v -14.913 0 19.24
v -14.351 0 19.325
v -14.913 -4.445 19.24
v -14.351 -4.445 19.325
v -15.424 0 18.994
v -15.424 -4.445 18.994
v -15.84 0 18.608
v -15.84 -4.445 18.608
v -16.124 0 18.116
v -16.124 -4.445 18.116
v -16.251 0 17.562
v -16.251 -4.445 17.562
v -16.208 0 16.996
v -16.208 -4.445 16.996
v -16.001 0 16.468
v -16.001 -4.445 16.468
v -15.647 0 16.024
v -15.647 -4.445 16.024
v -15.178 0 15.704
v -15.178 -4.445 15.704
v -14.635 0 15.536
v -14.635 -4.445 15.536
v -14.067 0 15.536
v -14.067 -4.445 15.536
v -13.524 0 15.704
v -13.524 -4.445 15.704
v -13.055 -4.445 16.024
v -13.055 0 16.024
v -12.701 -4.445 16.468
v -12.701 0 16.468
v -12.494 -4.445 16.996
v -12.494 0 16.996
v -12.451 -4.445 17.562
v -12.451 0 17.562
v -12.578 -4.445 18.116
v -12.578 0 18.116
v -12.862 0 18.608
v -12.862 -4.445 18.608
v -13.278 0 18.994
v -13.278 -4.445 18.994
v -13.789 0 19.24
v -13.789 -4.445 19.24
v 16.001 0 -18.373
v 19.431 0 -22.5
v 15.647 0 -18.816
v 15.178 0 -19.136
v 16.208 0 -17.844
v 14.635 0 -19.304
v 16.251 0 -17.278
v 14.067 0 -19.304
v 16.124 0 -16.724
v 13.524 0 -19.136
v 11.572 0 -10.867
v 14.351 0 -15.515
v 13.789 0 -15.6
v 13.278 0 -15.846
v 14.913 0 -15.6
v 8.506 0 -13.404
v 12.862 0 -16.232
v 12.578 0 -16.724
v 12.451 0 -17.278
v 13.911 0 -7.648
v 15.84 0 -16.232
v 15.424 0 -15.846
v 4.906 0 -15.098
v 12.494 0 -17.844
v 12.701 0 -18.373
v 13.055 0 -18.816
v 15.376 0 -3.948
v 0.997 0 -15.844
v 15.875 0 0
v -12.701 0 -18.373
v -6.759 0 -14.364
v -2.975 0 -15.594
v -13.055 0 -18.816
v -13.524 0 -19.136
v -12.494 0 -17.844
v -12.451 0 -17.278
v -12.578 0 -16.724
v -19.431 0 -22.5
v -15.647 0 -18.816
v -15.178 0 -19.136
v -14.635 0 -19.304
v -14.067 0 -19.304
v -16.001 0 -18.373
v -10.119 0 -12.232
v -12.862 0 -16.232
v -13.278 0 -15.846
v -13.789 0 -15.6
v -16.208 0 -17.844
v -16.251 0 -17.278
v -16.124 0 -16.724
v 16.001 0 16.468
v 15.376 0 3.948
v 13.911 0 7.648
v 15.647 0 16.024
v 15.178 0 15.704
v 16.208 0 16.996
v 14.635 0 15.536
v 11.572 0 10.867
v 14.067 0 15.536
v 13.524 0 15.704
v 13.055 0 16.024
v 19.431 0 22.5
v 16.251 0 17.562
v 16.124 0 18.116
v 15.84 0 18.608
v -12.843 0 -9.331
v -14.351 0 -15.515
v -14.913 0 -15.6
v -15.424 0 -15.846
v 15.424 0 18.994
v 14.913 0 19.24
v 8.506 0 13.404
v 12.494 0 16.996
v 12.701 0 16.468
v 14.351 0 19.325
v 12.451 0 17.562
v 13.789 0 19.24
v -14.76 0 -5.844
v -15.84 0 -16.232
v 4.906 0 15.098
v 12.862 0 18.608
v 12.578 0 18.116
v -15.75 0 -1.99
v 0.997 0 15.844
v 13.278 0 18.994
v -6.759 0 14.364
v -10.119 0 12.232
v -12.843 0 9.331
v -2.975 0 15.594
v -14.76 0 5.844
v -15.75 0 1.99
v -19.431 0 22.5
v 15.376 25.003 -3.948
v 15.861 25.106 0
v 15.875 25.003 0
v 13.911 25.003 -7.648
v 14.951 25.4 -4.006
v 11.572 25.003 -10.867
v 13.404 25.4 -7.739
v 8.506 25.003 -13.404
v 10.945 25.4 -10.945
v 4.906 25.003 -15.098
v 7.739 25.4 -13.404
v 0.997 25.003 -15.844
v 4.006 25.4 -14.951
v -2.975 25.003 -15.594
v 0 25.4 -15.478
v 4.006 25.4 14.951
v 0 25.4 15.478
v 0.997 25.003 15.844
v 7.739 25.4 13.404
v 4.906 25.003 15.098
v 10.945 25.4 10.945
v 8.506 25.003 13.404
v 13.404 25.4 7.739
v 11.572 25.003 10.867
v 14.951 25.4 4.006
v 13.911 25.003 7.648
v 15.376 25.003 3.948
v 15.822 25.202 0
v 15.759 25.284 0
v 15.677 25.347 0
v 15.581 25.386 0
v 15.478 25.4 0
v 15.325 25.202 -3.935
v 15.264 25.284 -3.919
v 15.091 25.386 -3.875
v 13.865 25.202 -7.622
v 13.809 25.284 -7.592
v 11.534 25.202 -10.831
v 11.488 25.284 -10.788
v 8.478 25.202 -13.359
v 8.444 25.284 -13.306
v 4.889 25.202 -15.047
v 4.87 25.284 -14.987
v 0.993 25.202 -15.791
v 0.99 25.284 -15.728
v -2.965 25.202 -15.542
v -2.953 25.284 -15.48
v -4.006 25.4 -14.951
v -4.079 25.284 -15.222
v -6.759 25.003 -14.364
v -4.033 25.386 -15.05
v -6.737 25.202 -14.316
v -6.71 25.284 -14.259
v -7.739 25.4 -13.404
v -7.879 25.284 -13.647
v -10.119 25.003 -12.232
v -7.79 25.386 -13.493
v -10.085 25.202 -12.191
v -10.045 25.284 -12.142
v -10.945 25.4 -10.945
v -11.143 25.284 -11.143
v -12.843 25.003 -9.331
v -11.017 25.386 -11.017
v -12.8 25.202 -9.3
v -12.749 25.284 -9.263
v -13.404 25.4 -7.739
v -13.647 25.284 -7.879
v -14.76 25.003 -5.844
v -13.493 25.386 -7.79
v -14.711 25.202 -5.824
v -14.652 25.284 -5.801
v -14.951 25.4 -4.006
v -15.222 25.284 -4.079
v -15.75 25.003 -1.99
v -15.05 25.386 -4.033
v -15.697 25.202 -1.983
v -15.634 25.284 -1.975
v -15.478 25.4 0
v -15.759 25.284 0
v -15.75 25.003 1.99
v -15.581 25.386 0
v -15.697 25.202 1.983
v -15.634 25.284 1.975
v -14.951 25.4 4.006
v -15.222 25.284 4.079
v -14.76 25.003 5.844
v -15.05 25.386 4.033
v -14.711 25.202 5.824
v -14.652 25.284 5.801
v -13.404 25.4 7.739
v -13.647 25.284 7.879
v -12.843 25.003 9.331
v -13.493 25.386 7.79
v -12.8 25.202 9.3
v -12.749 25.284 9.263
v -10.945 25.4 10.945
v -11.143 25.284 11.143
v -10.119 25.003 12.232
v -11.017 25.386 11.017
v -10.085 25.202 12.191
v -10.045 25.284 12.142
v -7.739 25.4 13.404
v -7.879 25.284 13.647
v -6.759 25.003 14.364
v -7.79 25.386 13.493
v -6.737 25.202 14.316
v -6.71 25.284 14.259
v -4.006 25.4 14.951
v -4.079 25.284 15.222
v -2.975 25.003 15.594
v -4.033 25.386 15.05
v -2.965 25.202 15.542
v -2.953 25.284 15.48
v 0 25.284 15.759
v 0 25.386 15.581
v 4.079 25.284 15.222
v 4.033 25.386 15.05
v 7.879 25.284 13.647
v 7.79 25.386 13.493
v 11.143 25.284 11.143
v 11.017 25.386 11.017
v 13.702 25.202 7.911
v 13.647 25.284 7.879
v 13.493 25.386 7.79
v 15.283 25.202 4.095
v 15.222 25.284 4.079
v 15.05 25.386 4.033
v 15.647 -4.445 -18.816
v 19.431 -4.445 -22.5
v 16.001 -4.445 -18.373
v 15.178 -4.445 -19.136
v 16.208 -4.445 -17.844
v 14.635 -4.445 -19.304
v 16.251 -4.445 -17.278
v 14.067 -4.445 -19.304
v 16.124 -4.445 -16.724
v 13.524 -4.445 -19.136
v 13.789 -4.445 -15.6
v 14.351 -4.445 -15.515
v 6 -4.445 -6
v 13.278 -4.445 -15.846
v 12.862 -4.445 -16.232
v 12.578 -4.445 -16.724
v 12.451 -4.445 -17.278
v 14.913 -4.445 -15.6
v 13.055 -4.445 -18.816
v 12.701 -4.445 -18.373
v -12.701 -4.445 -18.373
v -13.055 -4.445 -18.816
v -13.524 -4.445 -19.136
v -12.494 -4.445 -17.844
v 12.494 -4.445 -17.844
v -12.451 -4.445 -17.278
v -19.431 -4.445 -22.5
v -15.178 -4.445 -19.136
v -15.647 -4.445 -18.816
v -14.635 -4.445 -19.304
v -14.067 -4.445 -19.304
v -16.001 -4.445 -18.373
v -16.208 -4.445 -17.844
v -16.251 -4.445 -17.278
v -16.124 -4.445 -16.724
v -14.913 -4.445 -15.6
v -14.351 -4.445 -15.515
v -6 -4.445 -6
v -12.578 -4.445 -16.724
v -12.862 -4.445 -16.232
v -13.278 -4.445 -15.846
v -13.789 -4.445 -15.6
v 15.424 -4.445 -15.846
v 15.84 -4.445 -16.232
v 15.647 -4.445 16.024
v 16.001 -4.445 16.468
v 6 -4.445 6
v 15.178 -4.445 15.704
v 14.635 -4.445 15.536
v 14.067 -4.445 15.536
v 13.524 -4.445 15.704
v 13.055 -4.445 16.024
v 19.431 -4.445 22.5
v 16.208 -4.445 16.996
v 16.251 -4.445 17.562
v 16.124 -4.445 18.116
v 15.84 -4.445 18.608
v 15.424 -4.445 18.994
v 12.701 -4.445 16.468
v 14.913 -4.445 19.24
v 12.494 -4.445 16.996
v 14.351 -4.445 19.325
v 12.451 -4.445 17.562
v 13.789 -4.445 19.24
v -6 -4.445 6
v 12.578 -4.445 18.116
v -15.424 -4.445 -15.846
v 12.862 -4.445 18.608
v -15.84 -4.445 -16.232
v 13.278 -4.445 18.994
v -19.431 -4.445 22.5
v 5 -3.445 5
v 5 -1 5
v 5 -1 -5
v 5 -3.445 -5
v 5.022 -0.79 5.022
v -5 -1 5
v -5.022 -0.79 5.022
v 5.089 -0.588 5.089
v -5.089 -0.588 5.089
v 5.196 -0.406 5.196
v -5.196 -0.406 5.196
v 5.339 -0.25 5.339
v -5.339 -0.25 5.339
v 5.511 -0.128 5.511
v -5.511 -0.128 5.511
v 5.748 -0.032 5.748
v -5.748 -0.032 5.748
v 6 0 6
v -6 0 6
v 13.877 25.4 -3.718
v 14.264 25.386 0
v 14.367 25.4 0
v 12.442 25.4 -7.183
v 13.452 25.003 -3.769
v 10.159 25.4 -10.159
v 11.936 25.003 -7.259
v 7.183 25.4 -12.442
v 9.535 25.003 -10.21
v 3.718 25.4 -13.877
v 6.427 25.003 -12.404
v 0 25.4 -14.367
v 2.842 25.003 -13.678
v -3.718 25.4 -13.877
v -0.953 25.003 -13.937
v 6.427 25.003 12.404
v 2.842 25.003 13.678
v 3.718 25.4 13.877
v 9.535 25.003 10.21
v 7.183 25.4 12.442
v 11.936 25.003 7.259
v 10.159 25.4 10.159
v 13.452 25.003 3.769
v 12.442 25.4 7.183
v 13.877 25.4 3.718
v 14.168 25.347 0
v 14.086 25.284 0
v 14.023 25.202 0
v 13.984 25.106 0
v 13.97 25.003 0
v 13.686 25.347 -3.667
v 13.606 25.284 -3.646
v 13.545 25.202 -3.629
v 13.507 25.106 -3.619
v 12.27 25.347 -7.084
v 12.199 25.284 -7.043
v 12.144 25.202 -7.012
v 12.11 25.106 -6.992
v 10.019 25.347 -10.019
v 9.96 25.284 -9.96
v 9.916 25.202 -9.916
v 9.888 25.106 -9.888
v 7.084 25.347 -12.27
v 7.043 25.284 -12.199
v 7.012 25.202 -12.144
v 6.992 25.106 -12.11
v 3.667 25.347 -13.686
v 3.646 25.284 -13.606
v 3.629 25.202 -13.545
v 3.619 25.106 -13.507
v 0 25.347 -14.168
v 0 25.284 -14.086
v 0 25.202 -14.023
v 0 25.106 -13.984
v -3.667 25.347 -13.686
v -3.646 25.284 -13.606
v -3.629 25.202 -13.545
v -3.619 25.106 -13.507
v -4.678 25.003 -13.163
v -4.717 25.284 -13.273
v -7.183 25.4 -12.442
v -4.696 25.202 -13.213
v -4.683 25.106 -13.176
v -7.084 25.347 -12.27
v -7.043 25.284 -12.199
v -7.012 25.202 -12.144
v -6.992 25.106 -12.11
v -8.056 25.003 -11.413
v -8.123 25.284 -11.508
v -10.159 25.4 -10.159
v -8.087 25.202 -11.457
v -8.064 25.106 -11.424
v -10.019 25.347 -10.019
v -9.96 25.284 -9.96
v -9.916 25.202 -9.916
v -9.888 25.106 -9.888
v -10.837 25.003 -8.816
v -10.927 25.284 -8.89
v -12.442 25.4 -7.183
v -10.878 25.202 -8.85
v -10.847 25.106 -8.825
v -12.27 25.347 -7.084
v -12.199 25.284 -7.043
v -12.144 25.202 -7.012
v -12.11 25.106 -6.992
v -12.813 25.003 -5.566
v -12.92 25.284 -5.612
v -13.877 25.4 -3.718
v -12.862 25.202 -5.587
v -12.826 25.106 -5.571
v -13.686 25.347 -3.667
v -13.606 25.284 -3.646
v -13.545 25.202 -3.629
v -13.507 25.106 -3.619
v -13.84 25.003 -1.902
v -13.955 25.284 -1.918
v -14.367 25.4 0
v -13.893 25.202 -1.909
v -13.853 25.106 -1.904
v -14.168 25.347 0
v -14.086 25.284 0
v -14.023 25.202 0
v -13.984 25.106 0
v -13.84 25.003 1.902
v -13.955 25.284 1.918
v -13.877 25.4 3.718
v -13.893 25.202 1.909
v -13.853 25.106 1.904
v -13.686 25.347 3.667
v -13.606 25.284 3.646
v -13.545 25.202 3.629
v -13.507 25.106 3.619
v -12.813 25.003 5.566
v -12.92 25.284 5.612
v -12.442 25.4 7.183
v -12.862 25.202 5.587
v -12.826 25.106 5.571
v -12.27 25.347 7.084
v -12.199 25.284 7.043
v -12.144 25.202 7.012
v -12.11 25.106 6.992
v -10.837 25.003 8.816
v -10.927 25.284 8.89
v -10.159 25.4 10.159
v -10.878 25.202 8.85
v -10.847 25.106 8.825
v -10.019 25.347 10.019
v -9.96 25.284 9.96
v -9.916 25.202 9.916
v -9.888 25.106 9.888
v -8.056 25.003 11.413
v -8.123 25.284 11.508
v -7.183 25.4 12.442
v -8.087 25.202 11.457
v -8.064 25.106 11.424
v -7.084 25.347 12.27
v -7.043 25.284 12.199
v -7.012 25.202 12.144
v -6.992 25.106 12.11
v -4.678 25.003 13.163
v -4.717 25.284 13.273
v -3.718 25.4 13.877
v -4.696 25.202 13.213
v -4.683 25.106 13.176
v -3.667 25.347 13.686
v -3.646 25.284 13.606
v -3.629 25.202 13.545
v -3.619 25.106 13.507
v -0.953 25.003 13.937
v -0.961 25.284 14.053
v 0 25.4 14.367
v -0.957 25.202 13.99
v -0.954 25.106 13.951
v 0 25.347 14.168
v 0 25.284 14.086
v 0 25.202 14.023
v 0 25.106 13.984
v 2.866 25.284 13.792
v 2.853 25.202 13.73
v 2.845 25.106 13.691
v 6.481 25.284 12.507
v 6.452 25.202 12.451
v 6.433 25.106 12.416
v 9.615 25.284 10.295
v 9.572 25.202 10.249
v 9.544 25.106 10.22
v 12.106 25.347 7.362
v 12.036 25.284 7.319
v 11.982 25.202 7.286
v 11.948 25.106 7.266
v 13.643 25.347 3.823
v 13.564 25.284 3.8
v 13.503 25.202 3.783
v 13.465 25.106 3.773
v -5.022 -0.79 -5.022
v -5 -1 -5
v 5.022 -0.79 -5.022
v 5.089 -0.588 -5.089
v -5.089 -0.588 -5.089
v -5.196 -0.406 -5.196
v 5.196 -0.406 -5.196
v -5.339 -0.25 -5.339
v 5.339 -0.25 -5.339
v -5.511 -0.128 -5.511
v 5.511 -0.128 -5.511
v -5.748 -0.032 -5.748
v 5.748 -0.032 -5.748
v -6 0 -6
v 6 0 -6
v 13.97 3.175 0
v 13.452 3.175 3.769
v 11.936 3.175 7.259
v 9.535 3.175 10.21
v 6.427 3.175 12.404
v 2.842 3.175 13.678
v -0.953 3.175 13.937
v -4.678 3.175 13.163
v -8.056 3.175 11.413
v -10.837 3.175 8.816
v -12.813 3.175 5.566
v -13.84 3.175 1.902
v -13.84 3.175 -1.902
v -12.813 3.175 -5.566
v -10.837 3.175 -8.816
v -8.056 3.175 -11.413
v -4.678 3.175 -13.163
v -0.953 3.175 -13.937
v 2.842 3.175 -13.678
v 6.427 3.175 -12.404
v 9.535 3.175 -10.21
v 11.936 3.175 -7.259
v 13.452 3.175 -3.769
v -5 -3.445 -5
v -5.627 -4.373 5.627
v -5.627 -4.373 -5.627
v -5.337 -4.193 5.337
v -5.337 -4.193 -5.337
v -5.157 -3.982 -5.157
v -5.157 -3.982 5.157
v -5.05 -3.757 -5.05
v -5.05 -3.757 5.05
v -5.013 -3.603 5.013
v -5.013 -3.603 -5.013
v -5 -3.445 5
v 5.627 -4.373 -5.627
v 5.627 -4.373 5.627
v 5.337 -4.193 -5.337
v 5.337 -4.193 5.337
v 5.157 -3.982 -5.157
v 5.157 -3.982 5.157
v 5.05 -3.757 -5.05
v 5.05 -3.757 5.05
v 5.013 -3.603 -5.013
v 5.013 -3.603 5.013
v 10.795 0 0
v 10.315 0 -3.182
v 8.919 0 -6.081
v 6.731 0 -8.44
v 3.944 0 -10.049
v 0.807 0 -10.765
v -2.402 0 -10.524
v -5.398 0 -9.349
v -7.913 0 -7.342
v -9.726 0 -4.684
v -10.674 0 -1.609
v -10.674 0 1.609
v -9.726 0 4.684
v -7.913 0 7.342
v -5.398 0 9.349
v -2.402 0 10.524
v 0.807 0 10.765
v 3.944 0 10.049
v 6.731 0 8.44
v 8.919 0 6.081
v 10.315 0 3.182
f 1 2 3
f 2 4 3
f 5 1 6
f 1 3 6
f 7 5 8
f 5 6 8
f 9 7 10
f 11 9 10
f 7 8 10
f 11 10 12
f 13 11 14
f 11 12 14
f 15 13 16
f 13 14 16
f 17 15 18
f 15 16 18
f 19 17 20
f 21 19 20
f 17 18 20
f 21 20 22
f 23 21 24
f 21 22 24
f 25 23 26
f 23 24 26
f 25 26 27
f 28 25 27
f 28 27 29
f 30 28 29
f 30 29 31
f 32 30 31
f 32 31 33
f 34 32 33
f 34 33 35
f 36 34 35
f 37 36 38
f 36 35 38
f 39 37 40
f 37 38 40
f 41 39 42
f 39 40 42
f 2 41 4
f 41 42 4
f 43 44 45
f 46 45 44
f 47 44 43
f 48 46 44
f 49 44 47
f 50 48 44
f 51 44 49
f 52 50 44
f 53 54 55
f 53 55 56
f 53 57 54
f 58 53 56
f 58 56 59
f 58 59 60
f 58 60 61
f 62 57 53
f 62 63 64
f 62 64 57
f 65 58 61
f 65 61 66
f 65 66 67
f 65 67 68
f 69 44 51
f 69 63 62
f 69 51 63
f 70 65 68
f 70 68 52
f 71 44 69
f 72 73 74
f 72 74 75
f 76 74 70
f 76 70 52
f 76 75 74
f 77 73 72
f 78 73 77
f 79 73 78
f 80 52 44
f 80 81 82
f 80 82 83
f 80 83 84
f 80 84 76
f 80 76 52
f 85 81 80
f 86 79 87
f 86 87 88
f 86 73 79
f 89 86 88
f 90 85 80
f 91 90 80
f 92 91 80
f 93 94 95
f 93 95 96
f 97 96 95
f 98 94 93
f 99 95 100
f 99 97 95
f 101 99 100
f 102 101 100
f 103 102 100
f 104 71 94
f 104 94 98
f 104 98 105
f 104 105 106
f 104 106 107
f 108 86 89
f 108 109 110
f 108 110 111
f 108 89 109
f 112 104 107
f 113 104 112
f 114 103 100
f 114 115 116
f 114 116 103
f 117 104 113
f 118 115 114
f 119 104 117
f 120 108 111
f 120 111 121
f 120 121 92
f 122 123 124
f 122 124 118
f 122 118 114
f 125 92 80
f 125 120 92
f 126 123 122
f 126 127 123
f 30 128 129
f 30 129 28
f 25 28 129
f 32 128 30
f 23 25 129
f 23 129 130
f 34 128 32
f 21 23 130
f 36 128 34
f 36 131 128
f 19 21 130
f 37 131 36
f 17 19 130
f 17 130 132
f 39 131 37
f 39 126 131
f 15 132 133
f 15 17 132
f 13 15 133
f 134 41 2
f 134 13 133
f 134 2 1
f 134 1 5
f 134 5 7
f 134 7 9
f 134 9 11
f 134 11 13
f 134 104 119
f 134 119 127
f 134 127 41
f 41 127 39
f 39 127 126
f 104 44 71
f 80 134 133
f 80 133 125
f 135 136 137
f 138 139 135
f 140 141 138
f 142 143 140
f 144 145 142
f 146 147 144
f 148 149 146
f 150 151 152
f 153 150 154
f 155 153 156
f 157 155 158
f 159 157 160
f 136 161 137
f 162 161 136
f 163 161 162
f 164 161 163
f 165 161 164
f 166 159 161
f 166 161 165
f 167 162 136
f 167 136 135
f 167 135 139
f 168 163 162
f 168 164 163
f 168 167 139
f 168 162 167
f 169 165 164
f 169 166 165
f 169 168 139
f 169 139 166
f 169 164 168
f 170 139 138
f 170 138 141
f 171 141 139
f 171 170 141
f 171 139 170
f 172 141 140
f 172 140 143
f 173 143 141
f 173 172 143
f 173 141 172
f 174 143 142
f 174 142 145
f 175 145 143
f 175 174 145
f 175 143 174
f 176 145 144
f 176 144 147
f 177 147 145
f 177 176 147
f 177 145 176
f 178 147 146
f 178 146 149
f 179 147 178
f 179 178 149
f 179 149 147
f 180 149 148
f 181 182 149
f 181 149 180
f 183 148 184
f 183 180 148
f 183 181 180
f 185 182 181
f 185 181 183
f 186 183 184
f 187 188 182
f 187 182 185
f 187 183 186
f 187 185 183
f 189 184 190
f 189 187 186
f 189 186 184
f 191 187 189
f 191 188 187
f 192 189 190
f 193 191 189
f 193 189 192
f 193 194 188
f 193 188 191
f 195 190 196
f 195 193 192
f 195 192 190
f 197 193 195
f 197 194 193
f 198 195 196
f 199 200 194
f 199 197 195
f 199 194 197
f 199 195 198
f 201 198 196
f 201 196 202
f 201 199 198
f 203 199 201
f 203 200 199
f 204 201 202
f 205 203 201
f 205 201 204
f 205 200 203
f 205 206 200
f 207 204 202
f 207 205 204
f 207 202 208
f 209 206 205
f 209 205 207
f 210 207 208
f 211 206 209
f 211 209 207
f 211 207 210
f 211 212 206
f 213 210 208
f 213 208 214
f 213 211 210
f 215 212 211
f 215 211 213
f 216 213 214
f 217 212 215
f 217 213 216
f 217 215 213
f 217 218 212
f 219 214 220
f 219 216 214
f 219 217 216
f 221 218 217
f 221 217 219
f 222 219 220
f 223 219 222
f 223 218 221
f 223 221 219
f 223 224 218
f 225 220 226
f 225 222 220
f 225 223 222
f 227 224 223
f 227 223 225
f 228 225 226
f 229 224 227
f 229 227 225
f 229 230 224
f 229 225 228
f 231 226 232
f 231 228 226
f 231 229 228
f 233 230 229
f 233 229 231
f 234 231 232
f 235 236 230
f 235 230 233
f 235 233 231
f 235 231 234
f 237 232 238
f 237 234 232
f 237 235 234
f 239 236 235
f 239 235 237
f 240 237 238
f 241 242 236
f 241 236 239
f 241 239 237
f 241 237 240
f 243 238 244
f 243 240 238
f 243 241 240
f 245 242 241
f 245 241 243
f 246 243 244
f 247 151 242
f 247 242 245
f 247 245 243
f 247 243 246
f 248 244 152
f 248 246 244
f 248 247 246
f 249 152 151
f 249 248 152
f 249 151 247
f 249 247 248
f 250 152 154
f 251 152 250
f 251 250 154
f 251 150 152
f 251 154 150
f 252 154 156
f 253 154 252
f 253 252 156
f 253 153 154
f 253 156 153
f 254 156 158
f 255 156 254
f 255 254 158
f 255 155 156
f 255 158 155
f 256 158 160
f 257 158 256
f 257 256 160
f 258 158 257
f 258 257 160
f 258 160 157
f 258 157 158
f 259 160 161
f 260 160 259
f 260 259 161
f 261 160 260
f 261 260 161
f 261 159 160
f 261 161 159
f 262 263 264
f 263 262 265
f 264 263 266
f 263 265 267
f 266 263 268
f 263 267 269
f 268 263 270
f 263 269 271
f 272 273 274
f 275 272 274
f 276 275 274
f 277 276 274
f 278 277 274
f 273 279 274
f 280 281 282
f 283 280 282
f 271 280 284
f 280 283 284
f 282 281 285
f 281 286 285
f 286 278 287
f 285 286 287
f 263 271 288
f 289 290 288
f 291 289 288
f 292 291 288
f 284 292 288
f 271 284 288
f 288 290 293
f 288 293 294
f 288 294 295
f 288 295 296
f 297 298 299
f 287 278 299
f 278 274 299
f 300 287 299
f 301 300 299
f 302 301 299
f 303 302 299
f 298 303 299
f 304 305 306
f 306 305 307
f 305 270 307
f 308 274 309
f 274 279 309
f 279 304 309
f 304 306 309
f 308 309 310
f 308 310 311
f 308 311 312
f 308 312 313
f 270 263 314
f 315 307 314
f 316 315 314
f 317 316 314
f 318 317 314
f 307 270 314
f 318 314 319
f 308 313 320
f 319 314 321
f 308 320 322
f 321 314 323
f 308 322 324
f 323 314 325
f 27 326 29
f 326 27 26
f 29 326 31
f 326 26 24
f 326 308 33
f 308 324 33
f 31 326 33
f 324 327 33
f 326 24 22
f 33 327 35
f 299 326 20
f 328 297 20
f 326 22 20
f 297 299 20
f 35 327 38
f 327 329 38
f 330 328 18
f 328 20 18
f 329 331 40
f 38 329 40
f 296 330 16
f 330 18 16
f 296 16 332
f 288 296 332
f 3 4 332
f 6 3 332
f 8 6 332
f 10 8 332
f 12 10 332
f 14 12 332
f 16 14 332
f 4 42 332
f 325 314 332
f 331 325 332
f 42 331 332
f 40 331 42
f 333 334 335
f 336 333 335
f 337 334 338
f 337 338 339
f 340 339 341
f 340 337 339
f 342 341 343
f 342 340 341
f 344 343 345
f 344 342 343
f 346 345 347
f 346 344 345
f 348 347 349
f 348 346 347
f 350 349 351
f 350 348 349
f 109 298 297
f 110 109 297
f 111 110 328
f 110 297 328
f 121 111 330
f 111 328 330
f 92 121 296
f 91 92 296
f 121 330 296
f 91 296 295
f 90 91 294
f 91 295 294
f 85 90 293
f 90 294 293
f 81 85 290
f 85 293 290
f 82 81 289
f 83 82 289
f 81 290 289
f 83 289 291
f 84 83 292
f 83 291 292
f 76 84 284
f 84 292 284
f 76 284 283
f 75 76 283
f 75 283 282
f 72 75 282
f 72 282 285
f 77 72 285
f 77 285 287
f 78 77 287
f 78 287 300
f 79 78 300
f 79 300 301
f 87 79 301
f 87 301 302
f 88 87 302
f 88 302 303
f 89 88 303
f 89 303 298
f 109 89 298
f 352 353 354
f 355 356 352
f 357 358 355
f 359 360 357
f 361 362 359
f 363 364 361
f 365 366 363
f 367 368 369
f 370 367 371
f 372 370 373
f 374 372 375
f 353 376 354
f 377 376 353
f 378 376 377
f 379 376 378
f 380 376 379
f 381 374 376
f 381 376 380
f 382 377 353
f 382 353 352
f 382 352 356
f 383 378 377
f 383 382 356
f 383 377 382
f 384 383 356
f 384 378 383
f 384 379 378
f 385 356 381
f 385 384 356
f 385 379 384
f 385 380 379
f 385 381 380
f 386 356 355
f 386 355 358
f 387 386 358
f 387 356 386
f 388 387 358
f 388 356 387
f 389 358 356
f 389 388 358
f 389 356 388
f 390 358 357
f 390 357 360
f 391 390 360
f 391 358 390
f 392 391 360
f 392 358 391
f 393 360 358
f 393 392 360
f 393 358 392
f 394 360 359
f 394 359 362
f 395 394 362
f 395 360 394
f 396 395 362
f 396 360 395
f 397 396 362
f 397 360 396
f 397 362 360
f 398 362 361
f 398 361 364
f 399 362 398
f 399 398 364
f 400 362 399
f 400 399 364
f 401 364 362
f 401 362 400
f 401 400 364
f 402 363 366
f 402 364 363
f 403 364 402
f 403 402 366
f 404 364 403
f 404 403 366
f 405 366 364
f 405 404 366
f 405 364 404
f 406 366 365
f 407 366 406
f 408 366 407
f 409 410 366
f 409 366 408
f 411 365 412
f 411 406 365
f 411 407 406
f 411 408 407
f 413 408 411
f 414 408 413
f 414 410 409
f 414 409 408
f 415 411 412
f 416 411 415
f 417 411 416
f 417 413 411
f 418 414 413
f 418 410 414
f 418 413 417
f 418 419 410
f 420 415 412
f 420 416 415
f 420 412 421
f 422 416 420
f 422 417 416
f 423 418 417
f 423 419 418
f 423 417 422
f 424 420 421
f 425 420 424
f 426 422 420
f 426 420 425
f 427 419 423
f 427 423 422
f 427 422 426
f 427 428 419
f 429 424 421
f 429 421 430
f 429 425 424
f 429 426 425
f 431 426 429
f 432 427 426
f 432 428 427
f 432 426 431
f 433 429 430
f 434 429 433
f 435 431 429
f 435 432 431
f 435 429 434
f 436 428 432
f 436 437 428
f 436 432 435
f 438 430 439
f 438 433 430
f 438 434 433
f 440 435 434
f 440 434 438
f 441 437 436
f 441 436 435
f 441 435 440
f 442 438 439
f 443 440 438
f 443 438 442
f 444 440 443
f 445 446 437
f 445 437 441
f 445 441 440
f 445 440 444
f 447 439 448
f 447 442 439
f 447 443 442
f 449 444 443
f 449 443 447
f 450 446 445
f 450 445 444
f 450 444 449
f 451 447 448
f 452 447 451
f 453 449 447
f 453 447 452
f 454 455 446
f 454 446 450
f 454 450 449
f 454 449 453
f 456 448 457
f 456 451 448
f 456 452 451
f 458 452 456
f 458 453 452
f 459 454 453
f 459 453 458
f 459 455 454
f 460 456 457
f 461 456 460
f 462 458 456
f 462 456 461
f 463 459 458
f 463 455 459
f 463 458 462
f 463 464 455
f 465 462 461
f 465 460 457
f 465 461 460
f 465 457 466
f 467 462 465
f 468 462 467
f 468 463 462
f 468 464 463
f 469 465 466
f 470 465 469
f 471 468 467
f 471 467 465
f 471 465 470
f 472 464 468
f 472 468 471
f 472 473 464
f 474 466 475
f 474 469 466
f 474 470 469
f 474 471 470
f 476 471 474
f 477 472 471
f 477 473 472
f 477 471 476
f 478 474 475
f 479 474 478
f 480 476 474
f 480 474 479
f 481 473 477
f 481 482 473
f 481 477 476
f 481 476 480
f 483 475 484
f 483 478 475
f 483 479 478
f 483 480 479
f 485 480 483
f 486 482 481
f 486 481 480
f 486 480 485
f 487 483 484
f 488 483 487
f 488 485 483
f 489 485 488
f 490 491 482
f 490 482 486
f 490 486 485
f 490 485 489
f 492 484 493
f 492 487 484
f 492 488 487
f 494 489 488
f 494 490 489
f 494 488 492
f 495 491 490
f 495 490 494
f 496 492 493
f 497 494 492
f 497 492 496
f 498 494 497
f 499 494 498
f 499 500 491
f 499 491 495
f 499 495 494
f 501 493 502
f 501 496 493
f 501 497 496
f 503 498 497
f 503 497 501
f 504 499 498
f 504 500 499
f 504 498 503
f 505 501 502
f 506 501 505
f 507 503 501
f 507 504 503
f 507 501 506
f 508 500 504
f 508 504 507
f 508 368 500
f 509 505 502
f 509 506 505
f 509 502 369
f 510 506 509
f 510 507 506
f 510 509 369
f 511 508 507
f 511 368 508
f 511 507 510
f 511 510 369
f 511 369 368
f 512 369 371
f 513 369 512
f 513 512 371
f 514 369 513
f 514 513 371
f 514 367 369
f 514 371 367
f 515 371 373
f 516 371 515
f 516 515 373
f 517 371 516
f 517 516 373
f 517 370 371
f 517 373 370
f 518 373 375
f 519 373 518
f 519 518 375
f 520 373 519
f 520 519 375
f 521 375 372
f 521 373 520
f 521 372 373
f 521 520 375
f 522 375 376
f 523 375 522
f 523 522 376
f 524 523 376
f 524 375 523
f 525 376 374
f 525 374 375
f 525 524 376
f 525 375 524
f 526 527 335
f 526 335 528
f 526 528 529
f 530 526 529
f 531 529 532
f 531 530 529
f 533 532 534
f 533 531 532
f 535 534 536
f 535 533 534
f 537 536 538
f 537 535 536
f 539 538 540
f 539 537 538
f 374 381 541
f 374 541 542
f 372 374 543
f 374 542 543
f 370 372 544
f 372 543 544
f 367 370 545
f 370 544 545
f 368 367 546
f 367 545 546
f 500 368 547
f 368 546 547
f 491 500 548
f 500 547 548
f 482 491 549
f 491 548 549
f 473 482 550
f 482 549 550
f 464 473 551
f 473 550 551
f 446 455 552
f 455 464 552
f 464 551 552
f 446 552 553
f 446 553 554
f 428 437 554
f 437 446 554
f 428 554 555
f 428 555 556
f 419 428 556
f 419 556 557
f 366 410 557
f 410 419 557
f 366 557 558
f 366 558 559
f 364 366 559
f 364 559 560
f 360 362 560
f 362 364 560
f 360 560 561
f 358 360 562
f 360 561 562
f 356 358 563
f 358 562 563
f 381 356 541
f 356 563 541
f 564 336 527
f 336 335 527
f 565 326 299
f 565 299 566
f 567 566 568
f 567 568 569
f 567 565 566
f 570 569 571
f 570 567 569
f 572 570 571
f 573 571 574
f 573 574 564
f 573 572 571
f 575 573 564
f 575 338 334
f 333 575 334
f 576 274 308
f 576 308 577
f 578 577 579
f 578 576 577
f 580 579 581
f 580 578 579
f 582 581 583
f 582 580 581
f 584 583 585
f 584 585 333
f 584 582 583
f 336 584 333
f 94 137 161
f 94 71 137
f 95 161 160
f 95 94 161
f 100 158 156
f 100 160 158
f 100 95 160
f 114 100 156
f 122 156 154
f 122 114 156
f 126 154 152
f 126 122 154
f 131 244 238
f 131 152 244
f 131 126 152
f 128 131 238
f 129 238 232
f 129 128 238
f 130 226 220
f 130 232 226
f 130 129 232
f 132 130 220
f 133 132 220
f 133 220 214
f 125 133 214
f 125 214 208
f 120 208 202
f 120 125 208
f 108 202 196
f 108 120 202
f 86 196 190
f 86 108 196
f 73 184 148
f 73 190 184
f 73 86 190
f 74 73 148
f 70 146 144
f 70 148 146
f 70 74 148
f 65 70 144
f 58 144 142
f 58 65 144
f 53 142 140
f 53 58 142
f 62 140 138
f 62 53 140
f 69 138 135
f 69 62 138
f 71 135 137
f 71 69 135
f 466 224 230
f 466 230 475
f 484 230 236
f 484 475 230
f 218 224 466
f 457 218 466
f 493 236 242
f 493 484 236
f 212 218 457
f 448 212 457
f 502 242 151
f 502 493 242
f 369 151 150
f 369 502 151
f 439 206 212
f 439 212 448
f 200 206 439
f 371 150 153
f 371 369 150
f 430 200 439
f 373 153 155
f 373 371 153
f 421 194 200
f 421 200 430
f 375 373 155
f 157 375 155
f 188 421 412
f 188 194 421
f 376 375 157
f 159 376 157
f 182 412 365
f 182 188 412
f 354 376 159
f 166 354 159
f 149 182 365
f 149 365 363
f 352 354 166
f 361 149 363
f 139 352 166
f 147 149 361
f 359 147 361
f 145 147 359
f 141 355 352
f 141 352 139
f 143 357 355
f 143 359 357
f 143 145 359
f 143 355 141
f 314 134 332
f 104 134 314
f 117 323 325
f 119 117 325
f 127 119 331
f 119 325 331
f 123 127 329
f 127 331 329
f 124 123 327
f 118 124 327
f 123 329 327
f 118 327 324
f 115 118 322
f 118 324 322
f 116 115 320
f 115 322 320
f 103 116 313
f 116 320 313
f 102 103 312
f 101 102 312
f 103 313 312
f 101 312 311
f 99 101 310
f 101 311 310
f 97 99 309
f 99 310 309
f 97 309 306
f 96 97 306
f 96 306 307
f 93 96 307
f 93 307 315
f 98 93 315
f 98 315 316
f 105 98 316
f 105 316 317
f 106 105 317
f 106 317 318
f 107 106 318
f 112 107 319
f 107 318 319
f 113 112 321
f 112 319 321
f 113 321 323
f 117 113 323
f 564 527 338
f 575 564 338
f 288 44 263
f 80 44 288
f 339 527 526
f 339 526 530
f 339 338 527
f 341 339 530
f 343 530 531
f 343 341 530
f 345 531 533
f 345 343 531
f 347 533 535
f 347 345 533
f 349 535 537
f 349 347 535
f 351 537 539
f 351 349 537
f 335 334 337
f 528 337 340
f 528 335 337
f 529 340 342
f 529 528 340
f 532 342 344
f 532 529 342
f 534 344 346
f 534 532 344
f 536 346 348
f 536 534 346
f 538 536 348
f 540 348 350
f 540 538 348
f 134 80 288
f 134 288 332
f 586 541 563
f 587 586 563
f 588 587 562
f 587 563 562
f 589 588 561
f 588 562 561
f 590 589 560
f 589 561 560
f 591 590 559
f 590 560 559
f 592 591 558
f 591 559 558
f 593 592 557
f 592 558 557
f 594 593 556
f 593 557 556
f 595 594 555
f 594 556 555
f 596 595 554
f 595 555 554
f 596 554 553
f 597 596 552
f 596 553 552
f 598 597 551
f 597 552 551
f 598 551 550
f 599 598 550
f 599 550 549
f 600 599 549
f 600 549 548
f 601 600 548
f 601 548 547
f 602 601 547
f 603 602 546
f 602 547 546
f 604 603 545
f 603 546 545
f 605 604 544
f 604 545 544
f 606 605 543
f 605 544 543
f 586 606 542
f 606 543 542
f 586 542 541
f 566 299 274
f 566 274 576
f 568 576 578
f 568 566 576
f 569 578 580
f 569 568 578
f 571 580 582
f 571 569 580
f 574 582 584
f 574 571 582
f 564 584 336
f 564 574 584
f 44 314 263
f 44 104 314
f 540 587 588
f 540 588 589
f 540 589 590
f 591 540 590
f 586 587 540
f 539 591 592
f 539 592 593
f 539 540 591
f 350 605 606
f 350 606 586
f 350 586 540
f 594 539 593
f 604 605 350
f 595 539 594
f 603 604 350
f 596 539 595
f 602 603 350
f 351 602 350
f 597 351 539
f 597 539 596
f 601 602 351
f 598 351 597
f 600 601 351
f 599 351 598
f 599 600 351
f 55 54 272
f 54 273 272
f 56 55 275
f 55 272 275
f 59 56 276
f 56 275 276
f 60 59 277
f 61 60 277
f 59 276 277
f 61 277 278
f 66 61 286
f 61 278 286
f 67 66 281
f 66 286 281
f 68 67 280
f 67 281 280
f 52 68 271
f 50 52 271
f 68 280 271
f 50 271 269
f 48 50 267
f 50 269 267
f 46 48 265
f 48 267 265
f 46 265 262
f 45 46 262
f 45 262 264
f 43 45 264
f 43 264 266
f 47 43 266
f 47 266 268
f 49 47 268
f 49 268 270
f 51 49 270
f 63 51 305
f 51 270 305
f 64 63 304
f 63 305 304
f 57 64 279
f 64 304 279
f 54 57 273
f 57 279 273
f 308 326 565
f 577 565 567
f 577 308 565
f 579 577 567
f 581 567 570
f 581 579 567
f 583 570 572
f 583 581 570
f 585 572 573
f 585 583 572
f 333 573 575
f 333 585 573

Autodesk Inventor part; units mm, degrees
ref_plane "YZ Plane" through (0, 0, 0) normal (1, 0, 0) x (0, 1, 0)
ref_plane "XZ Plane" through (0, 0, 0) normal (0, 1, 0) x (-1, 0, 0)
ref_plane "XY Plane" through (0, 0, 0) normal (0, 0, 1) x (1, 0, 0)
sketch "Sketch1" plane through (0, 0, 0) normal (0, 1, 0) x (-1, 0, 0)
  line L0 (19.431, 22.5) -> (-19.431, 22.5)
  line L1 (-19.431, 22.5) -> (-19.431, -22.5)
  line L2 (-19.431, -22.5) -> (19.431, -22.5)
  line L3 (19.431, -22.5) -> (19.431, 22.5)
  line L4 (19.431, 22.5) -> (-19.431, -22.5) construction
  line L5 (-19.431, 22.5) -> (19.431, -22.5) construction
  point P0 (0, 0)
  dimension "d0" = 38.862
  dimension "d1" = 45
extrude "ExtrusionForFloor" add sketch "Sketch1" against normal blind 4.445
sketch "Sketch4" plane through (0, 0, 0) normal (0, 1, 0) x (1, 0, 0)
  line L0 (-5, -5) -> (5, -5)
  line L1 (5, -5) -> (5, 5)
  line L2 (5, 5) -> (-5, 5)
  line L3 (-5, 5) -> (-5, -5)
  line L4 (-5, -5) -> (5, 5) construction
  line L5 (5, -5) -> (-5, 5) construction
  point P0 (0, 0)
  dimension "d21" = 10
extrude "ExtrusionForCameraHole" cut sketch "Sketch4" against normal through all
sketch "Sketch5" plane through (0, -4.445, 0) normal (0, -1, 0) x (1, 0, 0)
  line L0 (18.161, 21.23) -> (-18.161, 21.23)
  line L1 (-18.161, 21.23) -> (-18.161, -21.23)
  line L2 (-18.161, -21.23) -> (18.161, -21.23)
  line L3 (18.161, -21.23) -> (18.161, 21.23)
  line L4 (18.161, 21.23) -> (-18.161, -21.23) construction
  line L5 (-18.161, 21.23) -> (18.161, -21.23) construction
  line L6 (19.431, -22.5) -> (19.431, 22.5) projected
  line L7 (19.431, 22.5) -> (-19.431, 22.5) projected
  line L8 (19.431, 22.5) -> (-19.431, 22.5)
  line L9 (-19.431, 22.5) -> (-19.431, -22.5)
  line L10 (-19.431, -22.5) -> (19.431, -22.5)
  line L11 (19.431, -22.5) -> (19.431, 22.5)
  line L12 (-19.431, 22.5) -> (-19.431, -22.5) projected
  line L13 (-19.431, -22.5) -> (19.431, -22.5) projected
  point P0 (0, 0)
  dimension "d24" = 1.27
  dimension "d25" = 1.27
  dimension "d41" = 0
  dimension "d43" = 0
sketch "Sketch7" plane through (0, 0, 0) normal (0, 1, 0) x (1, 0, 0)
  circle A0 centre (0, 0) radius 15.875
  circle A1 centre (0, 0) radius 13.97
  dimension "d32" = 31.75
  dimension "d33" = 27.94
extrude "ExtrusionForEyepieceAttachement" add sketch "Sketch7" along normal blind 25.4
sketch "Sketch19" plane through (0, 0, 0) normal (0, 1, 0) x (1, 0, 0)
  circle A0 centre (-14.351, 17.42) radius 1.2192 projected
  circle A1 centre (-14.351, -17.42) radius 1.2192 projected
  circle A2 centre (14.351, -17.42) radius 1.2192 projected
  circle A3 centre (14.351, 17.42) radius 1.2192 projected
  line L0 (19.431, -22.5) -> (19.431, 22.5) projected
  line L1 (-19.431, 22.5) -> (-19.431, -22.5) projected
  line L2 (-19.431, -22.5) -> (19.431, -22.5) projected
  line L3 (19.431, 22.5) -> (-19.431, 22.5) projected
  point P0 (0, 0)
  dimension "d104" = 5.08
  dimension "d105" = 5.08
  dimension "d106" = 5.08
  dimension "d107" = 5.08
  dimension "d108" = 5.08
  dimension "d109" = 5.08
  dimension "d110" = 5.08
  dimension "d111" = 5.08
hole "Hole5" at (-14.351, 0, -17.42) at (-14.351, 0, 17.42) at (14.351, 0, 17.42) at (14.351, 0, -17.42) direction (0, -1, 0) diameter 3.81 end through all clearance for "Flat Head Machine Screw (82)" size "#6" standard "Ansi Unified Screw Threads"
fillet "Fillet3" radius 0.3969 2 edges at (-15.875, 25.4, 0) (-13.97, 25.4, 0)
fillet "Fillet4" radius 1 4 edges at (-5, -4.445, 0) (0, -4.445, -5) (5, -4.445, 0) (0, -4.445, 5)
fillet "Fillet5" radius 1 4 edges at (0, 0, 5) (-5, 0, 0) (0, 0, -5) (5, 0, 0)
chamfer "Chamfer2" distance 3.175 angle 45 1 edges at (-13.97, 0, 0)
equation "\"d1\" = CaseWidth"
equation "\"d21\" = PiCameraLensCover"
equation "\"d24\" = CaseWallThickness"
equation "\"d25\" = CaseWallThickness"
equation "\"d32\" = EyepieceOutsideDiameter"
equation "\"d33\" = EyepieceInnerDiameter"
equation "\"d34\" = EyepieceAdapterLength"
equation "\"PiCameraLength\" = 23.862"
equation "\"PiCameraWidth\" = 25"
equation "\"PiCameraLensCover\" = 10"
equation "\"EyepieceAdapterLength\" = 25.4"
equation "\"OffsetForBoltPattern\" = 3.175"
equation "\"FloorThickness\" = 1.905"
equation "\"SlotForEyepiece\" = 2.54"
equation "\"CaseWidth\" = 45"
equation "\"CaseWallThickness\" = 1.27"
equation "\"EyepieceOutsideDiameter\" = 31.75"
equation "\"EyepieceInnerDiameter\" = 27.94"
properties part number "TelescopeAttachementForCase" material "Polypropylene"
